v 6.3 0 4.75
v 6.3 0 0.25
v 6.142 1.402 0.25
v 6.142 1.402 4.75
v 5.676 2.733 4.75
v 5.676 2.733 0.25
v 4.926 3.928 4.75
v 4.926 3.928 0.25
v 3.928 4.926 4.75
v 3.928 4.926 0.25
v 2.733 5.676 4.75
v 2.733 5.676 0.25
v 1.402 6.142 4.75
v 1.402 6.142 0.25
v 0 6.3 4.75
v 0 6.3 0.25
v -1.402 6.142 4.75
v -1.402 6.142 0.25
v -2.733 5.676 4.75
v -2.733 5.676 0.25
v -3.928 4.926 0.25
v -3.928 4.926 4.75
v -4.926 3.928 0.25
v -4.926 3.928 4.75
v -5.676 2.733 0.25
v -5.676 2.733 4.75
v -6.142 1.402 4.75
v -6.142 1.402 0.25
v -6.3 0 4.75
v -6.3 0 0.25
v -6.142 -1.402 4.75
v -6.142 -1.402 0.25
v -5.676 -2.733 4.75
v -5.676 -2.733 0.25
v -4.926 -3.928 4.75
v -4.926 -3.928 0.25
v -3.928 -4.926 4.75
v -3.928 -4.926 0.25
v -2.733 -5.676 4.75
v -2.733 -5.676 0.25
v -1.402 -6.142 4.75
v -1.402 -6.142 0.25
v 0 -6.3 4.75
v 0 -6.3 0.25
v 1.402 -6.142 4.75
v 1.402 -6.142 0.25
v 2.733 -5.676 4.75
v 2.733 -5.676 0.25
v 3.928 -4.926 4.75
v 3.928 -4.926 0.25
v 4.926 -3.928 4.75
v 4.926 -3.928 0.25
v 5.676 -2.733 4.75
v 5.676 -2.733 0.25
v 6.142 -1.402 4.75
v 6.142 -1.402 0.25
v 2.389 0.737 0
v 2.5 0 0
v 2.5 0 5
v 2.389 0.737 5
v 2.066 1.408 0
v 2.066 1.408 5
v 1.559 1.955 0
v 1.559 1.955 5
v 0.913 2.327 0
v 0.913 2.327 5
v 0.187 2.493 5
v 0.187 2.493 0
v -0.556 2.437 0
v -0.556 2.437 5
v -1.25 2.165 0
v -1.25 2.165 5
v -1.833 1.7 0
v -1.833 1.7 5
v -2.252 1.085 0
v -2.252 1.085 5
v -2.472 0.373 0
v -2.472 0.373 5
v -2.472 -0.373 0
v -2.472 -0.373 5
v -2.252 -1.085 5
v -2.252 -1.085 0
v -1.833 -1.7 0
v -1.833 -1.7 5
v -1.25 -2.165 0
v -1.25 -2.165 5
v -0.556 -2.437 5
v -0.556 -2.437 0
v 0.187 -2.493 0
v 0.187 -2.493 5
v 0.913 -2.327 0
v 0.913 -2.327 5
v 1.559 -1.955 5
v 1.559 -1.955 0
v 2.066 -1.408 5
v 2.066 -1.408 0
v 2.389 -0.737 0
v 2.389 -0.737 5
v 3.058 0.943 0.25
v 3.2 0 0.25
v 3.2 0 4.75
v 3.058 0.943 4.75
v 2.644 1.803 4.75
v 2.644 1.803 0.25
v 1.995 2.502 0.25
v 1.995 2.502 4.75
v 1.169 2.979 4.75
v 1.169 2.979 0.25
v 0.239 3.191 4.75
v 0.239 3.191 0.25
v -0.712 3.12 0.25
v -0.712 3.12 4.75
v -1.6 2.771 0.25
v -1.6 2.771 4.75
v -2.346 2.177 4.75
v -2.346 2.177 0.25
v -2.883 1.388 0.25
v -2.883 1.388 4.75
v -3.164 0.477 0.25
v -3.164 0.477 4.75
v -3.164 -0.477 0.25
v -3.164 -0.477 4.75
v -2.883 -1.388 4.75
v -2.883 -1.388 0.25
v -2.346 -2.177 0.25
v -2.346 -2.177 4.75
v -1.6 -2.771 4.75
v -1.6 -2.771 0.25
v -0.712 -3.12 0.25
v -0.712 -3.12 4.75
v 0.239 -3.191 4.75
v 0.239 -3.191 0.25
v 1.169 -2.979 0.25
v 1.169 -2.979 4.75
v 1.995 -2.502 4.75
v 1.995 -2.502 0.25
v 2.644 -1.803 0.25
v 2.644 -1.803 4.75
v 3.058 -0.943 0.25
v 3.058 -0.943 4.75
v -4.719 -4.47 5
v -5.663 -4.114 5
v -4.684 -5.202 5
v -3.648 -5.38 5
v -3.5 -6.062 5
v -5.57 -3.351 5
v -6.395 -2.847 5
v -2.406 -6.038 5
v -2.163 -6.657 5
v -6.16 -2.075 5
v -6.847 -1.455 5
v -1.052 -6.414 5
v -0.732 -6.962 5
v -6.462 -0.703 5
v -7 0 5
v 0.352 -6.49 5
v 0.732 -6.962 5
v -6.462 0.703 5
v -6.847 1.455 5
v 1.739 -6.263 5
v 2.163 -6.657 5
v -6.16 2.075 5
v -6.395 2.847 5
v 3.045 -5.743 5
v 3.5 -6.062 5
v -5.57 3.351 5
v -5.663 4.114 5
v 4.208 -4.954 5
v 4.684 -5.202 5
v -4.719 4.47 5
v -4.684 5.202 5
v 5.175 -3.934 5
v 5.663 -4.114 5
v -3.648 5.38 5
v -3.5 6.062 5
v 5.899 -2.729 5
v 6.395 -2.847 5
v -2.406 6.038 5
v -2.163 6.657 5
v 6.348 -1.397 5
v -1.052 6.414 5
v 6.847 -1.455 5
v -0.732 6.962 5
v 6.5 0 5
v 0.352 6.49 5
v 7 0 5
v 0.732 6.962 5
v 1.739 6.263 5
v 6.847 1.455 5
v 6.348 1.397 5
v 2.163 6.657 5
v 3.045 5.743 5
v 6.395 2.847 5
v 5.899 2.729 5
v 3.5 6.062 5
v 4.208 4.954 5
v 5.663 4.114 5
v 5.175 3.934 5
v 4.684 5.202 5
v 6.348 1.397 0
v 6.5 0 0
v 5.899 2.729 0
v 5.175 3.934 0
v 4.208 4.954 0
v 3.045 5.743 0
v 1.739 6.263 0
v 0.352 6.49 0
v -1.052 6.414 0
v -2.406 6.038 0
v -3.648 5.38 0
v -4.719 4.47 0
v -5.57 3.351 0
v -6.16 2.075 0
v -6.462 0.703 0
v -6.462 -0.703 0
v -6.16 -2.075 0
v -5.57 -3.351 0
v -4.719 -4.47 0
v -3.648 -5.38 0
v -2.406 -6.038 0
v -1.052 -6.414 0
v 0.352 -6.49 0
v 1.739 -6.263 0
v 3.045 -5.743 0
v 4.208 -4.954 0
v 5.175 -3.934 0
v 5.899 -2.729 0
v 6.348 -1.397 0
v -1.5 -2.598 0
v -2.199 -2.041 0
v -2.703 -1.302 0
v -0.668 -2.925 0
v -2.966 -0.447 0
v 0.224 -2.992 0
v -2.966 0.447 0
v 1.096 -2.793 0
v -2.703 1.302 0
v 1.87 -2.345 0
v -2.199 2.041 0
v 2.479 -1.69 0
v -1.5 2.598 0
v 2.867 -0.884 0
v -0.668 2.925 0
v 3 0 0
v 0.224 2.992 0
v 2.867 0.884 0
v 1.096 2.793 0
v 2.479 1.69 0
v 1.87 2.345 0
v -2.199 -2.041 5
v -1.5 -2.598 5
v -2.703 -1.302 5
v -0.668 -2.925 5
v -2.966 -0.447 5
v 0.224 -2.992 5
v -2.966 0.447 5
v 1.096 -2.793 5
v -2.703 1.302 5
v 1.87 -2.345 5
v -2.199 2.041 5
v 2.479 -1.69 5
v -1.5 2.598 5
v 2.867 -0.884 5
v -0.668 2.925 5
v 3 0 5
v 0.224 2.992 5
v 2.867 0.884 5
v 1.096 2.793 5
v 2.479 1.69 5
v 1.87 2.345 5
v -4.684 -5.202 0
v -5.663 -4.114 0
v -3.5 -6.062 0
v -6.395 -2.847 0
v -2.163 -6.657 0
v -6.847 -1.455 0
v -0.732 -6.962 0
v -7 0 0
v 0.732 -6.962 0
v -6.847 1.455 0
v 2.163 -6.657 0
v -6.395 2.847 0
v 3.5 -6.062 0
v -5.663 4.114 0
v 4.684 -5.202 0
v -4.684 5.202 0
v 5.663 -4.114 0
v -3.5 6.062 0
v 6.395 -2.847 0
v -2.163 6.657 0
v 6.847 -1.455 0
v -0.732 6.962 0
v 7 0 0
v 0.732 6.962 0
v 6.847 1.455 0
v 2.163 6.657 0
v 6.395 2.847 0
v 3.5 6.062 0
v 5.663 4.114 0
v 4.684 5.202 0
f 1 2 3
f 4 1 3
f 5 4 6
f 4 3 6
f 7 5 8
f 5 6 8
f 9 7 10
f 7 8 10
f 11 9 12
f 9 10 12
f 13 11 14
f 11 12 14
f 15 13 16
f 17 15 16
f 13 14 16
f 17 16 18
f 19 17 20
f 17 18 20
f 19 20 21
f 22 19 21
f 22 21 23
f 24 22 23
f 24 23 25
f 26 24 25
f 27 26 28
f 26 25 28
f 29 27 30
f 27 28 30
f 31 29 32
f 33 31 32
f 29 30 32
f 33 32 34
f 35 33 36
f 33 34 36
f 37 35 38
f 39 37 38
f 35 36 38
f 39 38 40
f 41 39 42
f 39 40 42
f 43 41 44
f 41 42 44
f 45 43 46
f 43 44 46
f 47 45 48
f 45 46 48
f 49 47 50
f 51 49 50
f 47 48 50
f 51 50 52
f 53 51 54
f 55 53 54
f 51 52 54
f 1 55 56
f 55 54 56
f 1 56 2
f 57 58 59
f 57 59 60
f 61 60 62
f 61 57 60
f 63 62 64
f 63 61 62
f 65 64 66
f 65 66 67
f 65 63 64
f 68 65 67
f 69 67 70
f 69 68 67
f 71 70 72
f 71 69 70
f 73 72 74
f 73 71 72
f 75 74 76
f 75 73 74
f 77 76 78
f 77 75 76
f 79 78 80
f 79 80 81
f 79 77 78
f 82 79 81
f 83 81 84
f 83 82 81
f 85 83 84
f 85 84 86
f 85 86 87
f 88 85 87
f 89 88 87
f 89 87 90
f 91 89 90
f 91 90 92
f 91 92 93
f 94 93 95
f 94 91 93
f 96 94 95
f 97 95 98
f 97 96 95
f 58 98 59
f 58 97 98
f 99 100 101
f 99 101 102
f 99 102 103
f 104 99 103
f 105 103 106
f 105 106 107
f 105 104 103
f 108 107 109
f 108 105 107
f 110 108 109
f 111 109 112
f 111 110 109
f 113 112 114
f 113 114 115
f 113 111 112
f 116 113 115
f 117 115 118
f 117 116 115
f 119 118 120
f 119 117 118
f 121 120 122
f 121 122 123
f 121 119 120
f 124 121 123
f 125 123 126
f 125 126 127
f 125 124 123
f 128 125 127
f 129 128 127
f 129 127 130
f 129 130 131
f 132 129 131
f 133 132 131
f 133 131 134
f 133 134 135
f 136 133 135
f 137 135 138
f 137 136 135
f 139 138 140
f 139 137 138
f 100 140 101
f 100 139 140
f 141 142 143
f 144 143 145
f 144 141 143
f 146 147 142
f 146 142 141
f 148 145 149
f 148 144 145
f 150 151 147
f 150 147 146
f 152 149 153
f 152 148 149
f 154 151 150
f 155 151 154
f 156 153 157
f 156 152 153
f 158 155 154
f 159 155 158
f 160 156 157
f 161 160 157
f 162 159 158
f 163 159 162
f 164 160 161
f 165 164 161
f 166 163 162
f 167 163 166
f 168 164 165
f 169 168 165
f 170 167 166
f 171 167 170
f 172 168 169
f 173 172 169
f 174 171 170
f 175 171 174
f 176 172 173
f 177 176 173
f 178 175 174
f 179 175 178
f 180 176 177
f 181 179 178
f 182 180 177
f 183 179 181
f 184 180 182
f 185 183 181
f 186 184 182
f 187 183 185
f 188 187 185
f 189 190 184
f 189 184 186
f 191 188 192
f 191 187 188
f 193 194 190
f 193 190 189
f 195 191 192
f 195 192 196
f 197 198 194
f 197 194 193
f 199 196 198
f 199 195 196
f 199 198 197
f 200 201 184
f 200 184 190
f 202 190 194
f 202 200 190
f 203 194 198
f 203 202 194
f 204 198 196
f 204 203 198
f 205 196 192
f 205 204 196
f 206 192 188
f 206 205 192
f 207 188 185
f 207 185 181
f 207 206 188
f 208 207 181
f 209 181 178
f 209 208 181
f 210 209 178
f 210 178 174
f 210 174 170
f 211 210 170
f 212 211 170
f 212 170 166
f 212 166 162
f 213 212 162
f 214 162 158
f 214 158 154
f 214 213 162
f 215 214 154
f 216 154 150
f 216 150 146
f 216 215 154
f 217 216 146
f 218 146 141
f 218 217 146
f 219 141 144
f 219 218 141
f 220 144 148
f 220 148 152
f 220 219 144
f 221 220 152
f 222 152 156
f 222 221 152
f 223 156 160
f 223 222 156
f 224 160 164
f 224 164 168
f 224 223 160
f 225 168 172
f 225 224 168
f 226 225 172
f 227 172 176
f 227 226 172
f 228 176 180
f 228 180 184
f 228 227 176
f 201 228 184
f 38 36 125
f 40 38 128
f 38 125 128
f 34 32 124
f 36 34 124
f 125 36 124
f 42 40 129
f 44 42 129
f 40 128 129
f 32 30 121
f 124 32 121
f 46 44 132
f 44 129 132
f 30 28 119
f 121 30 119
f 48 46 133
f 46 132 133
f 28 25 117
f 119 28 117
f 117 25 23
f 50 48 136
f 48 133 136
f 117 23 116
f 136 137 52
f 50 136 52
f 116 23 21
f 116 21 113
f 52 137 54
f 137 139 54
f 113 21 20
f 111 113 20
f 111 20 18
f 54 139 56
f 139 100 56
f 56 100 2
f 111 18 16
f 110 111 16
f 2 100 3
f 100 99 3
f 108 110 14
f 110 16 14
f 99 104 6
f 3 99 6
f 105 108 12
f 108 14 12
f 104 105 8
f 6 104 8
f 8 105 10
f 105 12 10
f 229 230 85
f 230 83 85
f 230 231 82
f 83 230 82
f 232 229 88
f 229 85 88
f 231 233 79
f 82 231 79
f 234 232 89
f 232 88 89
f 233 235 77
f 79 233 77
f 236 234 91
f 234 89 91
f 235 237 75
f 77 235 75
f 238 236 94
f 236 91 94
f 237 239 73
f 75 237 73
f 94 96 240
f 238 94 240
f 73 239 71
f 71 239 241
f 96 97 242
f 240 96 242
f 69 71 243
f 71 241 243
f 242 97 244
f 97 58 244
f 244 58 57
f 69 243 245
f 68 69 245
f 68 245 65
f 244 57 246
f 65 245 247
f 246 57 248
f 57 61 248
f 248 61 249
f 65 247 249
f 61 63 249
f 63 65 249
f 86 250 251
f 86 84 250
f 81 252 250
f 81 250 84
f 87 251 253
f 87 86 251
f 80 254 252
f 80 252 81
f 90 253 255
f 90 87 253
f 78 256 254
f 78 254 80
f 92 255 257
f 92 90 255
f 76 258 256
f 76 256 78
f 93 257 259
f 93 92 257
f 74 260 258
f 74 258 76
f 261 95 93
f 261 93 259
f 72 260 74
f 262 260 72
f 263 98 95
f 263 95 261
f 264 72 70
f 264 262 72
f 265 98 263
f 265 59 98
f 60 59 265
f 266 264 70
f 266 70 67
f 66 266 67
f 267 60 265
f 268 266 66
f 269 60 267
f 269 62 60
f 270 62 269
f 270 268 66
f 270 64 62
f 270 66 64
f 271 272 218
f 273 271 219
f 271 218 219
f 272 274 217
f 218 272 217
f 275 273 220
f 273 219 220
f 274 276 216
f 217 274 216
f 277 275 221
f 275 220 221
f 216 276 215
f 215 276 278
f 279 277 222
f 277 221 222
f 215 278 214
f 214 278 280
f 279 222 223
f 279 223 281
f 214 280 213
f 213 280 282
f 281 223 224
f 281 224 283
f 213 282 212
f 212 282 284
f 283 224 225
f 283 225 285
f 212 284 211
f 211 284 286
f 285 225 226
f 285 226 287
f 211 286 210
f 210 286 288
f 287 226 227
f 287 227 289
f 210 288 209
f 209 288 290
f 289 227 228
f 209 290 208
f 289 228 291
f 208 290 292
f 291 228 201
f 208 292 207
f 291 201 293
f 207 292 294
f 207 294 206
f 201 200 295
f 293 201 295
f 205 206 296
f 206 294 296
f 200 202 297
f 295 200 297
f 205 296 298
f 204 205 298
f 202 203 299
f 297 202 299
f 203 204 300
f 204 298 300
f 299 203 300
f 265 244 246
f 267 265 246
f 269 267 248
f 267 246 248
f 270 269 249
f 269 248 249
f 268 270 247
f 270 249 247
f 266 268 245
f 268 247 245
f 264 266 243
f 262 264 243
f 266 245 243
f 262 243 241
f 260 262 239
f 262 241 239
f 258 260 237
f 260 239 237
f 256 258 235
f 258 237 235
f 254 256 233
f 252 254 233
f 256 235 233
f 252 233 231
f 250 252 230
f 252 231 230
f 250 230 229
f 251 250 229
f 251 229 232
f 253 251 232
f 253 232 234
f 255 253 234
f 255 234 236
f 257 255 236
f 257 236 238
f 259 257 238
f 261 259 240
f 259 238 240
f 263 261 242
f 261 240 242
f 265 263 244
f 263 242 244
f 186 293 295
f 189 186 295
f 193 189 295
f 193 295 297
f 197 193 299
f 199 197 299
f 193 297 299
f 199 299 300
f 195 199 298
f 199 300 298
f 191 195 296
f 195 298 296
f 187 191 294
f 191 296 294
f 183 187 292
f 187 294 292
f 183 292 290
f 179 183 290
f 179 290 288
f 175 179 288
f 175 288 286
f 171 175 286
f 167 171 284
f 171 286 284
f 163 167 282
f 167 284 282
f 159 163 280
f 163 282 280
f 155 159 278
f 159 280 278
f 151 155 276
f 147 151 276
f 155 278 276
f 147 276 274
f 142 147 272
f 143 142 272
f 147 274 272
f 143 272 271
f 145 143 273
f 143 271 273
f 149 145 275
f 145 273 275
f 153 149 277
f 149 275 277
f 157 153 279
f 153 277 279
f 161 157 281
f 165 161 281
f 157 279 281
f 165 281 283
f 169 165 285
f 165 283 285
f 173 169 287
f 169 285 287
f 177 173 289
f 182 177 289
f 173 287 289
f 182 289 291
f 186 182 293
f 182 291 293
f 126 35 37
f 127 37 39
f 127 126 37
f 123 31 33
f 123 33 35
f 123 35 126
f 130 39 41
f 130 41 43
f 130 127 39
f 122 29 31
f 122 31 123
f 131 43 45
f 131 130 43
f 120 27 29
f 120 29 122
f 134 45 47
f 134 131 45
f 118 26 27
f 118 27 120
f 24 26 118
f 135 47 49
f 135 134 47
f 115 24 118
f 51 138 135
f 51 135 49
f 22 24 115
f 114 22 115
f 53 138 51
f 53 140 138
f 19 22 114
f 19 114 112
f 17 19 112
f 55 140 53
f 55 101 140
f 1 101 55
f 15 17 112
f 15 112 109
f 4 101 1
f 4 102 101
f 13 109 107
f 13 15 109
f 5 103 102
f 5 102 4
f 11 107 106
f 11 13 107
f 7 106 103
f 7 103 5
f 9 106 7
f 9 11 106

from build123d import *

# Parameters (mm, degrees)
F0_R     = 7
F0_R_2   = 6.5
F0_R_3   = 3
F0_R_4   = 2.5
F1_DEPTH = 5
F2_R     = 6.3
F2_R_2   = 3.2
F3_DEPTH = 4.5


with BuildPart() as f1:
    # F0 (on Top) → F1 (new body)
    with BuildSketch(Plane.XY):
        Circle(F0_R)
        Circle(F0_R_2, mode=Mode.SUBTRACT)
        Circle(F0_R_3)
        Circle(F0_R_4, mode=Mode.SUBTRACT)
    extrude(amount=F1_DEPTH)


with BuildPart() as f3:
    # F2 (on Top) → F3 (new body)
    with BuildSketch(Plane.XY):
        Circle(F2_R)
        Circle(F2_R_2, mode=Mode.SUBTRACT)
    extrude(amount=F3_DEPTH)


with BuildPart() as f3_1:
    # F4: moved
    add(f3.part.moved(Location((0, 0, 0.25))))


solid = Compound([f1.part, f3_1.part])
